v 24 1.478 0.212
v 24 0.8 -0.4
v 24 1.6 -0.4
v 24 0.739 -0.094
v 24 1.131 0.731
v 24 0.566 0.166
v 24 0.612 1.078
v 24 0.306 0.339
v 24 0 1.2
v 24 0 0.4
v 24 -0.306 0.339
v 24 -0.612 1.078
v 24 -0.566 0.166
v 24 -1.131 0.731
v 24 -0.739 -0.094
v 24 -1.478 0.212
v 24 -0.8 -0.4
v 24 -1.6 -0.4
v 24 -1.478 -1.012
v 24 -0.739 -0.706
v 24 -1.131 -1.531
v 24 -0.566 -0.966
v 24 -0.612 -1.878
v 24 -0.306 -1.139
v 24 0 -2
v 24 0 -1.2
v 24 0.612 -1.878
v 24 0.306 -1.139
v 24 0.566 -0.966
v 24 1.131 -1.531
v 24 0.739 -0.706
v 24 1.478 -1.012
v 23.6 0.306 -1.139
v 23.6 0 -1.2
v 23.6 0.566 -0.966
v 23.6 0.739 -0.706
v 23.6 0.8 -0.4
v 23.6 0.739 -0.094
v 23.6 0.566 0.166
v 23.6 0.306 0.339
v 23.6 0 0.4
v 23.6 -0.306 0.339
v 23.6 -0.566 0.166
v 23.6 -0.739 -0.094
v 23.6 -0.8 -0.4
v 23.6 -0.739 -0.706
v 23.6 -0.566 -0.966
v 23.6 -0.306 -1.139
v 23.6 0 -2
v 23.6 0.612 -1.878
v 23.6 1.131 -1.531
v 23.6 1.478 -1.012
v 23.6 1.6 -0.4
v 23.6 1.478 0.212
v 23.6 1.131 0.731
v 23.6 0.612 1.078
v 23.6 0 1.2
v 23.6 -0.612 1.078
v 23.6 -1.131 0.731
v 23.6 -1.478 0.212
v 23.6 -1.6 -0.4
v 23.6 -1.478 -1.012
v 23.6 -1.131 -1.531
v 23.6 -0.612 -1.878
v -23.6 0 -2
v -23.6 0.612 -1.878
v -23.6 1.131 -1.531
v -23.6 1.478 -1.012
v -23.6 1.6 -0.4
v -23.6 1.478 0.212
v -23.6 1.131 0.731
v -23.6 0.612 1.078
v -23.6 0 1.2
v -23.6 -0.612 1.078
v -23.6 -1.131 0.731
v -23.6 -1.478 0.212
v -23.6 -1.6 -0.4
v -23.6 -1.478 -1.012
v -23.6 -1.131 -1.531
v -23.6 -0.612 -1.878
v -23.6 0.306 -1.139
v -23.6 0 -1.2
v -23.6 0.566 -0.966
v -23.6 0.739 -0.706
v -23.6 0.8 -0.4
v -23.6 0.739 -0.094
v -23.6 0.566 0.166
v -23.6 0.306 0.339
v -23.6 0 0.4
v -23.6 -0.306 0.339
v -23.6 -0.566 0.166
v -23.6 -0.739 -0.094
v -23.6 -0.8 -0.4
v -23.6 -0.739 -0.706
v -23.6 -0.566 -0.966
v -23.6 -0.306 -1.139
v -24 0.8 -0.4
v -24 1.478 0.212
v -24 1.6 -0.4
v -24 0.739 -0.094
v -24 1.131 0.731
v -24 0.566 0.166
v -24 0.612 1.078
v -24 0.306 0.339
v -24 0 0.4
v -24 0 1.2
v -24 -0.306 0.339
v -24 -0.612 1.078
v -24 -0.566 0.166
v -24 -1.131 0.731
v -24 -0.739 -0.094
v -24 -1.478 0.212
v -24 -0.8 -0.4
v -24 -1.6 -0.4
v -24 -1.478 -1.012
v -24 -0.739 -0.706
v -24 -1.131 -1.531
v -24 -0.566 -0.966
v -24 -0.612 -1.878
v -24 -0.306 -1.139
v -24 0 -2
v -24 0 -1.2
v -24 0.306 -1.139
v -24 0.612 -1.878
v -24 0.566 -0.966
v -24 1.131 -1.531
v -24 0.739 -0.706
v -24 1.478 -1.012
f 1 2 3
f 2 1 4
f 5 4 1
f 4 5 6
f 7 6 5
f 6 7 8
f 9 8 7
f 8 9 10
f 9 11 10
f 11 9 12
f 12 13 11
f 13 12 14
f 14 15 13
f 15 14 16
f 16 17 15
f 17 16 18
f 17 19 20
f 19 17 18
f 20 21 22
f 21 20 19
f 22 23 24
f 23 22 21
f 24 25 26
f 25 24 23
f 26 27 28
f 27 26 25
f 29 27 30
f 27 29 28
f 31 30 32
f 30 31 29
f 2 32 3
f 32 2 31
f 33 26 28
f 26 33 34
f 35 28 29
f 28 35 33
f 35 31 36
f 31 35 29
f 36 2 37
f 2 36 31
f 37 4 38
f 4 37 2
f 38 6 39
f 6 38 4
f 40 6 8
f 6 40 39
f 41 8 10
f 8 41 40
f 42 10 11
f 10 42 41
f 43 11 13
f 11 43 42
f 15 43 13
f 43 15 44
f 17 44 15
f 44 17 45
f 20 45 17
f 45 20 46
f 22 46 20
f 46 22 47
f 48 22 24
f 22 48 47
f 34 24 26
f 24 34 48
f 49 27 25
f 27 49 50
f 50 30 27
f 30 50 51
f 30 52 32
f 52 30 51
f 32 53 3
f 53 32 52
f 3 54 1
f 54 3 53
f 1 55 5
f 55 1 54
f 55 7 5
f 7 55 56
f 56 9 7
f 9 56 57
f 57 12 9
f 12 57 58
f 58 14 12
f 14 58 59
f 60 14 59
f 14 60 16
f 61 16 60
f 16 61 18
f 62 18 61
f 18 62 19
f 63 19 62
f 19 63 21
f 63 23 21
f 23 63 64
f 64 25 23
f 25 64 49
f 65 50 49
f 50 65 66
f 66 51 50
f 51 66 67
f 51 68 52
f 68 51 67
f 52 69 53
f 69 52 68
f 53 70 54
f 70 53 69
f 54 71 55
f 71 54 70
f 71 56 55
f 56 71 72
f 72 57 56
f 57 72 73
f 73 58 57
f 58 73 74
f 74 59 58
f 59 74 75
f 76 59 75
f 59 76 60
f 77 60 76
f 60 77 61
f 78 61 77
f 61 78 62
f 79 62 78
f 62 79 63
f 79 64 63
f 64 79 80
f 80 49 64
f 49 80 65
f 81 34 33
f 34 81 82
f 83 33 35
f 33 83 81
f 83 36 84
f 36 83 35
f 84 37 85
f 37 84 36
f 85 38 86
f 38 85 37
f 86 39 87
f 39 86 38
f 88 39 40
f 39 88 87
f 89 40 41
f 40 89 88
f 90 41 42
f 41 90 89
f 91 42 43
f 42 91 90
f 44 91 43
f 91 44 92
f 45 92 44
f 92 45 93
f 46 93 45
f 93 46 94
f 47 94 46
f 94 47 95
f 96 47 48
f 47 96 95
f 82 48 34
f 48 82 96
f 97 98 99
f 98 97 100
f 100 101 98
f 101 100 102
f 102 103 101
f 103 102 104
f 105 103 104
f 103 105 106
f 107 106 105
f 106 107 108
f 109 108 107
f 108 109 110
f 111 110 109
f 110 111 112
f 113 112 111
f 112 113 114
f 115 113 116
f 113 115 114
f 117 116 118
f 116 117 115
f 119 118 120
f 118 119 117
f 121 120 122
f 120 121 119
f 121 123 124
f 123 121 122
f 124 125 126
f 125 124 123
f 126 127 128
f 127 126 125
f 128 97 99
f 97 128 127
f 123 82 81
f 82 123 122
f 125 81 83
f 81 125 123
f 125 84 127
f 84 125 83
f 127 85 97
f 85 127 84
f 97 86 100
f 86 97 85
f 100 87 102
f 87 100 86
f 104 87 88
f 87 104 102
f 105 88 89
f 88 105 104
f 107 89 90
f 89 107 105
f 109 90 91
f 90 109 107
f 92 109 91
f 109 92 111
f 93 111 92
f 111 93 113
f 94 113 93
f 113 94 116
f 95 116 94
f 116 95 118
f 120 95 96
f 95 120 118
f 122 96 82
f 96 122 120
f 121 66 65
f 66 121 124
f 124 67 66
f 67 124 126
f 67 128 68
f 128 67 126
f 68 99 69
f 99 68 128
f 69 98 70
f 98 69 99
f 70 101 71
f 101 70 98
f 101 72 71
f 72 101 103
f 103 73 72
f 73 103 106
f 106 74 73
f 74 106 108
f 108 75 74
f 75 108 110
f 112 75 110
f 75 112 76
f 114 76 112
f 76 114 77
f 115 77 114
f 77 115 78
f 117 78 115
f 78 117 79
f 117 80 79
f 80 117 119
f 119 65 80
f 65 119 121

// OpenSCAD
// file: ../p/4-4disc.scad
use <../lib.scad>
$fa=1; $fs=0.2;
function ldraw_lib__4_4disc(realsolid=false) = [
// 0 Disc 1.0
// 0 Name: 4-4disc.dat
// 0 Author: James Jessiman
// 0 !LDRAW_ORG Primitive UPDATE 2002-02
// 0 !LICENSE Licensed under CC BY 2.0 and CC BY 4.0 : see CAreadme.txt
// 
// 0 BFC CERTIFY CCW
  [0,"BFC","CERTIFY"],
  [0,"BFC","CCW"],
// 
// 0 !HISTORY 1998-12-15 [PTadmin] Official Update 1998-10
// 0 !HISTORY 2002-03-23 [sbliss] Added BFC statement
// 0 !HISTORY 2002-04-25 [PTadmin] Official Update 2002-02
// 0 !HISTORY 2007-06-24 [PTadmin] Header formatted for Contributor Agreement
// 0 !HISTORY 2008-07-01 [PTadmin] Official Update 2008-01
// 
// 
// 3 16 0 0 0 1 0 0 0.9239 0 0.3827
  [3,16,0,0,0,1,0,0,0.9239,0,0.3827],
// 3 16 0 0 0 0.9239 0 0.3827 0.7071 0 0.7071
  [3,16,0,0,0,0.9239,0,0.3827,0.7071,0,0.7071],
// 3 16 0 0 0 0.7071 0 0.7071 0.3827 0 0.9239
  [3,16,0,0,0,0.7071,0,0.7071,0.3827,0,0.9239],
// 3 16 0 0 0 0.3827 0 0.9239 0 0 1
  [3,16,0,0,0,0.3827,0,0.9239,0,0,1],
// 3 16 0 0 0 0 0 1 -0.3827 0 0.9239
  [3,16,0,0,0,0,0,1,-0.3827,0,0.9239],
// 3 16 0 0 0 -0.3827 0 0.9239 -0.7071 0 0.7071
  [3,16,0,0,0,-0.3827,0,0.9239,-0.7071,0,0.7071],
// 3 16 0 0 0 -0.7071 0 0.7071 -0.9239 0 0.3827
  [3,16,0,0,0,-0.7071,0,0.7071,-0.9239,0,0.3827],
// 3 16 0 0 0 -0.9239 0 0.3827 -1 0 -0
  [3,16,0,0,0,-0.9239,0,0.3827,-1,0,-0],
// 3 16 0 0 0 -1 0 -0 -0.9239 0 -0.3827
  [3,16,0,0,0,-1,0,-0,-0.9239,0,-0.3827],
// 3 16 0 0 0 -0.9239 0 -0.3827 -0.7071 0 -0.7071
  [3,16,0,0,0,-0.9239,0,-0.3827,-0.7071,0,-0.7071],
// 3 16 0 0 0 -0.7071 0 -0.7071 -0.3827 0 -0.9239
  [3,16,0,0,0,-0.7071,0,-0.7071,-0.3827,0,-0.9239],
// 3 16 0 0 0 -0.3827 0 -0.9239 0 0 -1
  [3,16,0,0,0,-0.3827,0,-0.9239,0,0,-1],
// 3 16 0 0 0 0 0 -1 0.3827 0 -0.9239
  [3,16,0,0,0,0,0,-1,0.3827,0,-0.9239],
// 3 16 0 0 0 0.3827 0 -0.9239 0.7071 0 -0.7071
  [3,16,0,0,0,0.3827,0,-0.9239,0.7071,0,-0.7071],
// 3 16 0 0 0 0.7071 0 -0.7071 0.9239 0 -0.3827
  [3,16,0,0,0,0.7071,0,-0.7071,0.9239,0,-0.3827],
// 3 16 0 0 0 0.9239 0 -0.3827 1 0 0
  [3,16,0,0,0,0.9239,0,-0.3827,1,0,0],
// 0
];
module ldraw_lib__4_4disc(step=0, col=false, unit=2/5, alt=false, line=0.2, solid=!$preview)
    makepoly(ldraw_lib__4_4disc(solid), step=step, col=col, unit=unit, alt=alt, line=line, solid=solid);
ldraw_lib__4_4disc(line=0.2);
// file: ../p/stud3.scad
use <../lib.scad>
use <4-4cyli.scad>
use <4-4disc.scad>
use <4-4edge.scad>
$fa=1; $fs=0.2;
function ldraw_lib__stud3(realsolid=false) = realsolid ? 
    [openscad(translate([0,0,-eps()], o=cylinder(4+eps(), r=4)),2)] : [
// 0 Stud Tube Solid
// 0 Name: stud3.dat
// 0 Author: James Jessiman
// 0 !LDRAW_ORG Primitive UPDATE 2012-01
// 0 !LICENSE Licensed under CC BY 2.0 and CC BY 4.0 : see CAreadme.txt
// 
// 0 BFC CERTIFY CCW
  [0,"BFC","CERTIFY"],
  [0,"BFC","CCW"],
// 
// 0 !HISTORY 2002-04-04 [sbliss] Modified for BFC compliance
// 0 !HISTORY 2002-04-25 [PTadmin] Official Update 2002-02
// 0 !HISTORY 2007-06-24 [PTadmin] Header formatted for Contributor Agreement
// 0 !HISTORY 2008-07-01 [PTadmin] Official Update 2008-01
// 0 !HISTORY 2012-02-16 [Philo] Changed to CCW
// 0 !HISTORY 2012-03-30 [PTadmin] Official Update 2012-01
// 
// 
// 1 16 0 -4 0 4 0 0 0 1 0 0 0 4 4-4edge.dat
  [1,16,0,-4,0,4,0,0,0,1,0,0,0,4, ldraw_lib__4_4edge(realsolid)],
// 1 16 0 0 0 4 0 0 0 1 0 0 0 4 4-4edge.dat
  [1,16,0,0,0,4,0,0,0,1,0,0,0,4, ldraw_lib__4_4edge(realsolid)],
// 1 16 0 -4 0 4 0 0 0 1 0 0 0 4 4-4disc.dat
  [1,16,0,-4,0,4,0,0,0,1,0,0,0,4, ldraw_lib__4_4disc(realsolid)],
// 1 16 0 -4 0 4 0 0 0 4 0 0 0 4 4-4cyli.dat
  [1,16,0,-4,0,4,0,0,0,4,0,0,0,4, ldraw_lib__4_4cyli(realsolid)],
];
module ldraw_lib__stud3(step=0, col=false, unit=2/5, alt=false, line=0.2, solid=!$preview)
    makepoly(ldraw_lib__stud3(solid), step=step, col=col, unit=unit, alt=alt, line=line, solid=solid);
ldraw_lib__stud3(line=0.2);
// file: ../p/stud.scad
use <../lib.scad>
use <4-4cyli.scad>
use <4-4disc.scad>
use <4-4edge.scad>
$fa=1; $fs=0.2;
function ldraw_lib__stud(realsolid=false) = realsolid ? 
    [openscad(translate([0,0,-eps()], o=cylinder(4+eps(), r=6)),2)] : [
// 0 Stud
// 0 Name: stud.dat
// 0 Author: James Jessiman
// 0 !LDRAW_ORG Primitive UPDATE 2012-01
// 0 !LICENSE Licensed under CC BY 2.0 and CC BY 4.0 : see CAreadme.txt
// 
// 0 BFC CERTIFY CCW
  [0,"BFC","CERTIFY"],
  [0,"BFC","CCW"],
// 
// 0 !HISTORY 2002-04-04 [sbliss] Modified for BFC compliance
// 0 !HISTORY 2002-04-25 [PTadmin] Official Update 2002-02
// 0 !HISTORY 2007-06-24 [PTadmin] Header formatted for Contributor Agreement
// 0 !HISTORY 2008-07-01 [PTadmin] Official Update 2008-01
// 0 !HISTORY 2012-02-16 [Philo] Changed to CCW
// 0 !HISTORY 2012-03-30 [PTadmin] Official Update 2012-01
// 
// 
// 1 16 0 0 0 6 0 0 0 1 0 0 0 6 4-4edge.dat
  [1,16,0,0,0,6,0,0,0,1,0,0,0,6, ldraw_lib__4_4edge(realsolid)],
// 1 16 0 -4 0 6 0 0 0 1 0 0 0 6 4-4edge.dat
  [1,16,0,-4,0,6,0,0,0,1,0,0,0,6, ldraw_lib__4_4edge(realsolid)],
// 1 16 0 0 0 6 0 0 0 -4 0 0 0 6 4-4cyli.dat
  [1,16,0,0,0,6,0,0,0,-4,0,0,0,6, ldraw_lib__4_4cyli(realsolid)],
// 1 16 0 -4 0 6 0 0 0 1 0 0 0 6 4-4disc.dat
  [1,16,0,-4,0,6,0,0,0,1,0,0,0,6, ldraw_lib__4_4disc(realsolid)],
];
module ldraw_lib__stud(step=0, col=false, unit=2/5, alt=false, line=0.2, solid=!$preview)
    makepoly(ldraw_lib__stud(solid), step=step, col=col, unit=unit, alt=alt, line=line, solid=solid);
ldraw_lib__stud(line=0.2);
// file: ../p/box5.scad
use <../lib.scad>
$fa=1; $fs=0.2;
function ldraw_lib__box5(realsolid=false) = [
// 0 Box with 5 Faces and All Edges
// 0 Name: box5.dat
// 0 Author: James Jessiman
// 0 !LDRAW_ORG Primitive UPDATE 2012-01
// 0 !LICENSE Licensed under CC BY 2.0 and CC BY 4.0 : see CAreadme.txt
// 
// 0 BFC CERTIFY CCW
  [0,"BFC","CERTIFY"],
  [0,"BFC","CCW"],
// 
// 0 !HISTORY 2002-04-03 [sbliss] Modified for BFC compliance
// 0 !HISTORY 2002-04-25 [PTadmin] Official Update 2002-02
// 0 !HISTORY 2007-06-24 [PTadmin] Header formatted for Contributor Agreement
// 0 !HISTORY 2008-07-01 [PTadmin] Official Update 2008-01
// 0 !HISTORY 2012-02-16 [Philo] Changed to CCW
// 0 !HISTORY 2012-03-30 [PTadmin] Official Update 2012-01
// 
// 
// 2 24 1 1 1 -1 1 1
  [2,24,1,1,1,-1,1,1],
// 2 24 -1 1 1 -1 1 -1
  [2,24,-1,1,1,-1,1,-1],
// 2 24 -1 1 -1 1 1 -1
  [2,24,-1,1,-1,1,1,-1],
// 2 24 1 1 -1 1 1 1
  [2,24,1,1,-1,1,1,1],
// 2 24 1 0 1 -1 0 1
  [2,24,1,0,1,-1,0,1],
// 2 24 -1 0 1 -1 0 -1
  [2,24,-1,0,1,-1,0,-1],
// 2 24 -1 0 -1 1 0 -1
  [2,24,-1,0,-1,1,0,-1],
// 2 24 1 0 -1 1 0 1
  [2,24,1,0,-1,1,0,1],
// 2 24 1 0 1 1 1 1
  [2,24,1,0,1,1,1,1],
// 2 24 -1 0 1 -1 1 1
  [2,24,-1,0,1,-1,1,1],
// 2 24 1 0 -1 1 1 -1
  [2,24,1,0,-1,1,1,-1],
// 2 24 -1 0 -1 -1 1 -1
  [2,24,-1,0,-1,-1,1,-1],
// 4 16 -1 1 1 1 1 1 1 1 -1 -1 1 -1
  [4,16,-1,1,1,1,1,1,1,1,-1,-1,1,-1],
// 4 16 -1 1 1 -1 0 1 1 0 1 1 1 1
  [4,16,-1,1,1,-1,0,1,1,0,1,1,1,1],
// 4 16 -1 1 -1 -1 0 -1 -1 0 1 -1 1 1
  [4,16,-1,1,-1,-1,0,-1,-1,0,1,-1,1,1],
// 4 16 1 1 -1 1 0 -1 -1 0 -1 -1 1 -1
  [4,16,1,1,-1,1,0,-1,-1,0,-1,-1,1,-1],
// 4 16 1 1 1 1 0 1 1 0 -1 1 1 -1
  [4,16,1,1,1,1,0,1,1,0,-1,1,1,-1],
];
module ldraw_lib__box5(step=0, col=false, unit=2/5, alt=false, line=0.2, solid=!$preview)
    makepoly(ldraw_lib__box5(solid), step=step, col=col, unit=unit, alt=alt, line=line, solid=solid);
ldraw_lib__box5(line=0.2);
// file: ../p/box4t.scad
use <../lib.scad>
$fa=1; $fs=0.2;
function ldraw_lib__box4t(realsolid=false) = [
// 0 Box with 4 Adjacent Faces and All Edges
// 0 Name: box4t.dat
// 0 Author: Tore Eriksson [Tore_Eriksson]
// 0 !LDRAW_ORG Primitive UPDATE 2003-02
// 0 !LICENSE Licensed under CC BY 2.0 and CC BY 4.0 : see CAreadme.txt
// 
// 0 BFC CERTIFY CCW
  [0,"BFC","CERTIFY"],
  [0,"BFC","CCW"],
// 
// 0 !HISTORY 1997-09-29 [PTadmin] Official Update 1997-15
// 0 !HISTORY 2002-08-31 [izanette] Modified with WINDZ for BFC compliance
// 0 !HISTORY 2003-08-01 [PTadmin] Official Update 2003-02
// 0 !HISTORY 2007-06-24 [PTadmin] Header formatted for Contributor Agreement
// 0 !HISTORY 2008-07-01 [PTadmin] Official Update 2008-01
// 
// 
// 2 24 1 1 1 -1 1 1
  [2,24,1,1,1,-1,1,1],
// 2 24 -1 1 1 -1 1 -1
  [2,24,-1,1,1,-1,1,-1],
// 2 24 -1 1 -1 1 1 -1
  [2,24,-1,1,-1,1,1,-1],
// 2 24 1 1 -1 1 1 1
  [2,24,1,1,-1,1,1,1],
// 2 24 1 0 1 -1 0 1
  [2,24,1,0,1,-1,0,1],
// 2 24 -1 0 1 -1 0 -1
  [2,24,-1,0,1,-1,0,-1],
// 2 24 -1 0 -1 1 0 -1
  [2,24,-1,0,-1,1,0,-1],
// 2 24 1 0 -1 1 0 1
  [2,24,1,0,-1,1,0,1],
// 2 24 1 0 1 1 1 1
  [2,24,1,0,1,1,1,1],
// 2 24 -1 0 1 -1 1 1
  [2,24,-1,0,1,-1,1,1],
// 2 24 1 0 -1 1 1 -1
  [2,24,1,0,-1,1,1,-1],
// 2 24 -1 0 -1 -1 1 -1
  [2,24,-1,0,-1,-1,1,-1],
// 4 16 1 1 1 1 1 -1 -1 1 -1 -1 1 1
  [4,16,1,1,1,1,1,-1,-1,1,-1,-1,1,1],
// 4 16 1 1 1 -1 1 1 -1 0 1 1 0 1
  [4,16,1,1,1,-1,1,1,-1,0,1,1,0,1],
// 4 16 -1 1 1 -1 1 -1 -1 0 -1 -1 0 1
  [4,16,-1,1,1,-1,1,-1,-1,0,-1,-1,0,1],
// 0 4 16 -1 1 -1 -1 0 -1 1 0 -1 1 1 -1
// 4 16 1 1 -1 1 1 1 1 0 1 1 0 -1
  [4,16,1,1,-1,1,1,1,1,0,1,1,0,-1],
// 0
];
module ldraw_lib__box4t(step=0, col=false, unit=2/5, alt=false, line=0.2, solid=!$preview)
    makepoly(ldraw_lib__box4t(solid), step=step, col=col, unit=unit, alt=alt, line=line, solid=solid);
ldraw_lib__box4t(line=0.2);
// file: ../p/4-4ring1.scad
use <../lib.scad>
$fa=1; $fs=0.2;
function ldraw_lib__4_4ring1(realsolid=false) = [
// 0 Ring  1 x 1.0
// 0 Name: 4-4ring1.dat
// 0 Author: James Jessiman
// 0 !LDRAW_ORG Primitive UPDATE 2009-01
// 0 !LICENSE Licensed under CC BY 2.0 and CC BY 4.0 : see CAreadme.txt
// 
// 0 BFC CERTIFY CCW
  [0,"BFC","CERTIFY"],
  [0,"BFC","CCW"],
// 
// 0 !HISTORY 1998-12-15 [PTadmin] Official Update 1998-10
// 0 !HISTORY 2002-04-08 [BrickCaster] Modified for BFC compliance
// 0 !HISTORY 2002-04-25 [PTadmin] Official Update 2002-02
// 0 !HISTORY 2007-06-24 [PTadmin] Header formatted for Contributor Agreement
// 0 !HISTORY 2008-07-01 [PTadmin] Official Update 2008-01
// 0 !HISTORY 2008-08-26 [cwdee] Switch polygon winding and rename
// 0 !HISTORY 2009-05-02 [PTadmin] Official Update 2009-01
// 
// 
// 4 16 -0.7654 0 1.8478 -0.3827 0 0.9239 0 0 1 0 0 2
  [4,16,-0.7654,0,1.8478,-0.3827,0,0.9239,0,0,1,0,0,2],
// 4 16 -1.4142 0 1.4142 -0.7071 0 0.7071 -0.3827 0 0.9239 -0.7654 0 1.8478
  [4,16,-1.4142,0,1.4142,-0.7071,0,0.7071,-0.3827,0,0.9239,-0.7654,0,1.8478],
// 4 16 -1.8478 0 0.7654 -0.9239 0 0.3827 -0.7071 0 0.7071 -1.4142 0 1.41420
  [4,16,-1.8478,0,0.7654,-0.9239,0,0.3827,-0.7071,0,0.7071,-1.4142,0,1.41420],
// 4 16 -2 0 0 -1 0 0 -0.9239 0 0.3827 -1.8478 0 0.7654
  [4,16,-2,0,0,-1,0,0,-0.9239,0,0.3827,-1.8478,0,0.7654],
// 4 16 -1.8478 0 -0.7654 -0.9239 0 -0.3827 -1 0 0 -2 0 0
  [4,16,-1.8478,0,-0.7654,-0.9239,0,-0.3827,-1,0,0,-2,0,0],
// 4 16 -1.4142 0 -1.4142 -0.7071 0 -0.7071 -0.9239 0 -0.3827 -1.8478 0 -0.7654
  [4,16,-1.4142,0,-1.4142,-0.7071,0,-0.7071,-0.9239,0,-0.3827,-1.8478,0,-0.7654],
// 4 16 -0.7654 0 -1.8478 -0.3827 0 -0.9239 -0.7071 0 -0.7071 -1.4142 0 -1.4142
  [4,16,-0.7654,0,-1.8478,-0.3827,0,-0.9239,-0.7071,0,-0.7071,-1.4142,0,-1.4142],
// 4 16 0 0 -2 0 0 -1 -0.3827 0 -0.9239 -0.7654 0 -1.8478
  [4,16,0,0,-2,0,0,-1,-0.3827,0,-0.9239,-0.7654,0,-1.8478],
// 4 16 0.7654 0 -1.8478 0.3827 0 -0.9239 0 0 -1 0 0 -2
  [4,16,0.7654,0,-1.8478,0.3827,0,-0.9239,0,0,-1,0,0,-2],
// 4 16 1.4142 0 -1.4142 0.7071 0 -0.7071 0.3827 0 -0.9239 0.7654 0 -1.8478
  [4,16,1.4142,0,-1.4142,0.7071,0,-0.7071,0.3827,0,-0.9239,0.7654,0,-1.8478],
// 4 16 1.8478 0 -0.7654 0.9239 0 -0.3827 0.7071 0 -0.7071 1.4142 0 -1.4142
  [4,16,1.8478,0,-0.7654,0.9239,0,-0.3827,0.7071,0,-0.7071,1.4142,0,-1.4142],
// 4 16 2 0 0 1 0 0 0.9239 0 -0.3827 1.8478 0 -0.7654
  [4,16,2,0,0,1,0,0,0.9239,0,-0.3827,1.8478,0,-0.7654],
// 4 16 1.8478 0 0.7654 0.9239 0 0.3827 1 0 0 2 0 0
  [4,16,1.8478,0,0.7654,0.9239,0,0.3827,1,0,0,2,0,0],
// 4 16 1.4142 0 1.4142 0.7071 0 0.7071 0.9239 0 0.3827 1.8478 0 0.7654
  [4,16,1.4142,0,1.4142,0.7071,0,0.7071,0.9239,0,0.3827,1.8478,0,0.7654],
// 4 16 0.7654 0 1.8478 0.3827 0 0.9239 0.7071 0 0.7071 1.4142 0 1.4142
  [4,16,0.7654,0,1.8478,0.3827,0,0.9239,0.7071,0,0.7071,1.4142,0,1.4142],
// 4 16 0 0 2 0 0 1 0.3827 0 0.9239 0.7654 0 1.8478
  [4,16,0,0,2,0,0,1,0.3827,0,0.9239,0.7654,0,1.8478],
// 0
];
module ldraw_lib__4_4ring1(step=0, col=false, unit=2/5, alt=false, line=0.2, solid=!$preview)
    makepoly(ldraw_lib__4_4ring1(solid), step=step, col=col, unit=unit, alt=alt, line=line, solid=solid);
ldraw_lib__4_4ring1(line=0.2);
// file: ../p/4-4edge.scad
use <../lib.scad>
$fa=1; $fs=0.2;
function ldraw_lib__4_4edge(realsolid=false) = [
// 0 Circle 1.0
// 0 Name: 4-4edge.dat
// 0 Author: James Jessiman
// 0 !LDRAW_ORG Primitive UPDATE 2017-01
// 0 !LICENSE Licensed under CC BY 2.0 and CC BY 4.0 : see CAreadme.txt
// 
// 0 BFC CERTIFY CCW
  [0,"BFC","CERTIFY"],
  [0,"BFC","CCW"],
// 
// 0 !HISTORY 1998-12-15 [PTadmin] Official Update 1998-10
// 0 !HISTORY 2005-12-28 [PTadmin] Official Update 2005-01
// 0 !HISTORY 2007-06-24 [PTadmin] Header formatted for Contributor Agreement
// 0 !HISTORY 2008-07-01 [PTadmin] Official Update 2008-01
// 0 !HISTORY 2017-01-15 [Steffen] BFCed
// 0 !HISTORY 2017-12-30 [PTadmin] Official Update 2017-01
// 
// 
// 2 24 1 0 0 0.9239 0 0.3827
  [2,24,1,0,0,0.9239,0,0.3827],
// 2 24 0.9239 0 0.3827 0.7071 0 0.7071
  [2,24,0.9239,0,0.3827,0.7071,0,0.7071],
// 2 24 0.7071 0 0.7071 0.3827 0 0.9239
  [2,24,0.7071,0,0.7071,0.3827,0,0.9239],
// 2 24 0.3827 0 0.9239 0 0 1
  [2,24,0.3827,0,0.9239,0,0,1],
// 2 24 0 0 1 -0.3827 0 0.9239
  [2,24,0,0,1,-0.3827,0,0.9239],
// 2 24 -0.3827 0 0.9239 -0.7071 0 0.7071
  [2,24,-0.3827,0,0.9239,-0.7071,0,0.7071],
// 2 24 -0.7071 0 0.7071 -0.9239 0 0.3827
  [2,24,-0.7071,0,0.7071,-0.9239,0,0.3827],
// 2 24 -0.9239 0 0.3827 -1 0 -0
  [2,24,-0.9239,0,0.3827,-1,0,-0],
// 2 24 -1 0 -0 -0.9239 0 -0.3827
  [2,24,-1,0,-0,-0.9239,0,-0.3827],
// 2 24 -0.9239 0 -0.3827 -0.7071 0 -0.7071
  [2,24,-0.9239,0,-0.3827,-0.7071,0,-0.7071],
// 2 24 -0.7071 0 -0.7071 -0.3827 0 -0.9239
  [2,24,-0.7071,0,-0.7071,-0.3827,0,-0.9239],
// 2 24 -0.3827 0 -0.9239 0 0 -1
  [2,24,-0.3827,0,-0.9239,0,0,-1],
// 2 24 0 0 -1 0.3827 0 -0.9239
  [2,24,0,0,-1,0.3827,0,-0.9239],
// 2 24 0.3827 0 -0.9239 0.7071 0 -0.7071
  [2,24,0.3827,0,-0.9239,0.7071,0,-0.7071],
// 2 24 0.7071 0 -0.7071 0.9239 0 -0.3827
  [2,24,0.7071,0,-0.7071,0.9239,0,-0.3827],
// 2 24 0.9239 0 -0.3827 1 0 0
  [2,24,0.9239,0,-0.3827,1,0,0],
];
module ldraw_lib__4_4edge(step=0, col=false, unit=2/5, alt=false, line=0.2, solid=!$preview)
    makepoly(ldraw_lib__4_4edge(solid), step=step, col=col, unit=unit, alt=alt, line=line, solid=solid);
ldraw_lib__4_4edge(line=0.2);
// file: ../p/4-4cyli.scad
use <../lib.scad>
$fa=1; $fs=0.2;
function ldraw_lib__4_4cyli(realsolid=false) = [
// 0 Cylinder 1.0
// 0 Name: 4-4cyli.dat
// 0 Author: James Jessiman
// 0 !LDRAW_ORG Primitive UPDATE 2005-01
// 0 !LICENSE Licensed under CC BY 2.0 and CC BY 4.0 : see CAreadme.txt
// 
// 0 BFC CERTIFY CCW
  [0,"BFC","CERTIFY"],
  [0,"BFC","CCW"],
// 
// 0 !HISTORY 1998-12-15 [PTadmin] Official Update 1998-10
// 0 !HISTORY 2002-03-23 [sbliss] Added BFC statement; merged headers from files in distributions LDraw 0.27 and Complete.
// 0 !HISTORY 2002-04-25 [PTadmin] Official Update 2002-02
// 0 !HISTORY 2004-12-14 [guyvivan] BFC CCW
// 0 !HISTORY 2005-12-28 [PTadmin] Official Update 2005-01
// 0 !HISTORY 2007-06-24 [PTadmin] Header formatted for Contributor Agreement
// 0 !HISTORY 2008-07-01 [PTadmin] Official Update 2008-01
// 
// 
// 4 16 1 1 0 0.9239 1 0.3827 0.9239 0 0.3827 1 0 0
  [4,16,1,1,0,0.9239,1,0.3827,0.9239,0,0.3827,1,0,0],
// 5 24 1 0 0 1 1 0 0.9239 0 0.3827 0.9239 0 -0.3827
  [5,24,1,0,0,1,1,0,0.9239,0,0.3827,0.9239,0,-0.3827],
// 4 16 0.9239 1 0.3827 0.7071 1 0.7071 0.7071 0 0.7071 0.9239 0 0.3827
  [4,16,0.9239,1,0.3827,0.7071,1,0.7071,0.7071,0,0.7071,0.9239,0,0.3827],
// 5 24 0.9239 0 0.3827 0.9239 1 0.3827 0.7071 0 0.7071 1 0 0
  [5,24,0.9239,0,0.3827,0.9239,1,0.3827,0.7071,0,0.7071,1,0,0],
// 4 16 0.7071 1 0.7071 0.3827 1 0.9239 0.3827 0 0.9239 0.7071 0 0.7071
  [4,16,0.7071,1,0.7071,0.3827,1,0.9239,0.3827,0,0.9239,0.7071,0,0.7071],
// 5 24 0.7071 0 0.7071 0.7071 1 0.7071 0.3827 0 0.9239 0.9239 0 0.3827
  [5,24,0.7071,0,0.7071,0.7071,1,0.7071,0.3827,0,0.9239,0.9239,0,0.3827],
// 4 16 0.3827 1 0.9239 0 1 1 0 0 1 0.3827 0 0.9239
  [4,16,0.3827,1,0.9239,0,1,1,0,0,1,0.3827,0,0.9239],
// 5 24 0.3827 0 0.9239 0.3827 1 0.9239 0 0 1 0.7071 0 0.7071
  [5,24,0.3827,0,0.9239,0.3827,1,0.9239,0,0,1,0.7071,0,0.7071],
// 4 16 0 1 1 -0.3827 1 0.9239 -0.3827 0 0.9239 0 0 1
  [4,16,0,1,1,-0.3827,1,0.9239,-0.3827,0,0.9239,0,0,1],
// 5 24 0 0 1 0 1 1 -0.3827 0 0.9239 0.3827 0 0.9239
  [5,24,0,0,1,0,1,1,-0.3827,0,0.9239,0.3827,0,0.9239],
// 4 16 -0.3827 1 0.9239 -0.7071 1 0.7071 -0.7071 0 0.7071 -0.3827 0 0.9239
  [4,16,-0.3827,1,0.9239,-0.7071,1,0.7071,-0.7071,0,0.7071,-0.3827,0,0.9239],
// 5 24 -0.3827 0 0.9239 -0.3827 1 0.9239 -0.7071 0 0.7071 0 0 1
  [5,24,-0.3827,0,0.9239,-0.3827,1,0.9239,-0.7071,0,0.7071,0,0,1],
// 4 16 -0.7071 1 0.7071 -0.9239 1 0.3827 -0.9239 0 0.3827 -0.7071 0 0.7071
  [4,16,-0.7071,1,0.7071,-0.9239,1,0.3827,-0.9239,0,0.3827,-0.7071,0,0.7071],
// 5 24 -0.7071 0 0.7071 -0.7071 1 0.7071 -0.9239 0 0.3827 -0.3827 0 0.9239
  [5,24,-0.7071,0,0.7071,-0.7071,1,0.7071,-0.9239,0,0.3827,-0.3827,0,0.9239],
// 4 16 -0.9239 1 0.3827 -1 1 0 -1 0 0 -0.9239 0 0.3827
  [4,16,-0.9239,1,0.3827,-1,1,0,-1,0,0,-0.9239,0,0.3827],
// 5 24 -0.9239 0 0.3827 -0.9239 1 0.3827 -1 0 0 -0.7071 0 0.7071
  [5,24,-0.9239,0,0.3827,-0.9239,1,0.3827,-1,0,0,-0.7071,0,0.7071],
// 4 16 -1 1 0 -0.9239 1 -0.3827 -0.9239 0 -0.3827 -1 0 0
  [4,16,-1,1,0,-0.9239,1,-0.3827,-0.9239,0,-0.3827,-1,0,0],
// 5 24 -1 0 0 -1 1 0 -0.9239 0 -0.3827 -0.9239 0 0.3827
  [5,24,-1,0,0,-1,1,0,-0.9239,0,-0.3827,-0.9239,0,0.3827],
// 4 16 -0.9239 1 -0.3827 -0.7071 1 -0.7071 -0.7071 0 -0.7071 -0.9239 0 -0.3827
  [4,16,-0.9239,1,-0.3827,-0.7071,1,-0.7071,-0.7071,0,-0.7071,-0.9239,0,-0.3827],
// 5 24 -0.9239 0 -0.3827 -0.9239 1 -0.3827 -0.7071 0 -0.7071 -1 0 0
  [5,24,-0.9239,0,-0.3827,-0.9239,1,-0.3827,-0.7071,0,-0.7071,-1,0,0],
// 4 16 -0.7071 1 -0.7071 -0.3827 1 -0.9239 -0.3827 0 -0.9239 -0.7071 0 -0.7071
  [4,16,-0.7071,1,-0.7071,-0.3827,1,-0.9239,-0.3827,0,-0.9239,-0.7071,0,-0.7071],
// 5 24 -0.7071 0 -0.7071 -0.7071 1 -0.7071 -0.3827 0 -0.9239 -0.9239 0 -0.3827
  [5,24,-0.7071,0,-0.7071,-0.7071,1,-0.7071,-0.3827,0,-0.9239,-0.9239,0,-0.3827],
// 4 16 -0.3827 1 -0.9239 0 1 -1 0 0 -1 -0.3827 0 -0.9239
  [4,16,-0.3827,1,-0.9239,0,1,-1,0,0,-1,-0.3827,0,-0.9239],
// 5 24 -0.3827 0 -0.9239 -0.3827 1 -0.9239 0 0 -1 -0.7071 0 -0.7071
  [5,24,-0.3827,0,-0.9239,-0.3827,1,-0.9239,0,0,-1,-0.7071,0,-0.7071],
// 4 16 0 1 -1 0.3827 1 -0.9239 0.3827 0 -0.9239 0 0 -1
  [4,16,0,1,-1,0.3827,1,-0.9239,0.3827,0,-0.9239,0,0,-1],
// 5 24 0 0 -1 0 1 -1 0.3827 0 -0.9239 -0.3827 0 -0.9239
  [5,24,0,0,-1,0,1,-1,0.3827,0,-0.9239,-0.3827,0,-0.9239],
// 4 16 0.3827 1 -0.9239 0.7071 1 -0.7071 0.7071 0 -0.7071 0.3827 0 -0.9239
  [4,16,0.3827,1,-0.9239,0.7071,1,-0.7071,0.7071,0,-0.7071,0.3827,0,-0.9239],
// 5 24 0.3827 0 -0.9239 0.3827 1 -0.9239 0.7071 0 -0.7071 0 0 -1
  [5,24,0.3827,0,-0.9239,0.3827,1,-0.9239,0.7071,0,-0.7071,0,0,-1],
// 4 16 0.7071 1 -0.7071 0.9239 1 -0.3827 0.9239 0 -0.3827 0.7071 0 -0.7071
  [4,16,0.7071,1,-0.7071,0.9239,1,-0.3827,0.9239,0,-0.3827,0.7071,0,-0.7071],
// 5 24 0.7071 0 -0.7071 0.7071 1 -0.7071 0.9239 0 -0.3827 0.3827 0 -0.9239
  [5,24,0.7071,0,-0.7071,0.7071,1,-0.7071,0.9239,0,-0.3827,0.3827,0,-0.9239],
// 4 16 0.9239 1 -0.3827 1 1 0 1 0 0 0.9239 0 -0.3827
  [4,16,0.9239,1,-0.3827,1,1,0,1,0,0,0.9239,0,-0.3827],
// 5 24 0.9239 0 -0.3827 0.9239 1 -0.3827 1 0 0 0.7071 0 -0.7071
  [5,24,0.9239,0,-0.3827,0.9239,1,-0.3827,1,0,0,0.7071,0,-0.7071],
// 0
];
module ldraw_lib__4_4cyli(step=0, col=false, unit=2/5, alt=false, line=0.2, solid=!$preview)
    makepoly(ldraw_lib__4_4cyli(solid), step=step, col=col, unit=unit, alt=alt, line=line, solid=solid);
ldraw_lib__4_4cyli(line=0.2);
// file: s/3004s01.scad
use <../../lib.scad>
use <../../p/box4t.scad>
use <../../p/box5.scad>
use <../../p/stud.scad>
use <../../p/stud3.scad>
$fa=1; $fs=0.2;
function ldraw_lib__s__3004s01(realsolid=false) = [
// 0 ~Brick  1 x  2 without Front Face
// 0 Name: s\3004s01.dat
// 0 Author: James Jessiman
// 0 !LDRAW_ORG Subpart UPDATE 2003-03
// 0 !LICENSE Licensed under CC BY 2.0 and CC BY 4.0 : see CAreadme.txt
// 
// 0 BFC CERTIFY CCW
  [0,"BFC","CERTIFY"],
  [0,"BFC","CCW"],
// 
// 0 !HISTORY 2003-09-07 [jriley] Subfiling, BFC
// 0 !HISTORY 2003-12-19 [PTadmin] Official Update 2003-03
// 0 !HISTORY 2007-08-29 [PTadmin] Header formatted for Contributor Agreement
// 0 !HISTORY 2008-07-01 [PTadmin] Official Update 2008-01
// 
// 
// 1 16 0 4 0 1 0 0 0 -5 0 0 0 1 stud3.dat
  [1,16,0,4,0,1,0,0,0,-5,0,0,0,1, ldraw_lib__stud3(realsolid)],
// 0 BFC INVERTNEXT
  [0,"BFC","INVERTNEXT"],
// 1 16 0 24 0 16 0 0 0 -20 0 0 0 6 box5.dat
  [1,16,0,24,0,16,0,0,0,-20,0,0,0,6, ldraw_lib__box5(realsolid)],
// 4 16 20 24 10 16 24 6 -16 24 6 -20 24 10
  [4,16,20,24,10,16,24,6,-16,24,6,-20,24,10],
// 4 16 -20 24 10 -16 24 6 -16 24 -6 -20 24 -10
  [4,16,-20,24,10,-16,24,6,-16,24,-6,-20,24,-10],
// 4 16 -20 24 -10 -16 24 -6 16 24 -6 20 24 -10
  [4,16,-20,24,-10,-16,24,-6,16,24,-6,20,24,-10],
// 4 16 20 24 -10 16 24 -6 16 24 6 20 24 10
  [4,16,20,24,-10,16,24,-6,16,24,6,20,24,10],
// 1 16 0 24 0 20 0 0 0 -24 0 0 0 10 box4t.dat
  [1,16,0,24,0,20,0,0,0,-24,0,0,0,10, ldraw_lib__box4t(realsolid)],
// 1 16 10 0 0 1 0 0 0 1 0 0 0 1 stud.dat
  [1,16,10,0,0,1,0,0,0,1,0,0,0,1, ldraw_lib__stud(realsolid)],
// 1 16 -10 0 0 1 0 0 0 1 0 0 0 1 stud.dat
  [1,16,-10,0,0,1,0,0,0,1,0,0,0,1, ldraw_lib__stud(realsolid)],
// 0
];
module ldraw_lib__s__3004s01(step=0, col=false, unit=2/5, alt=false, line=0.2, solid=!$preview)
    makepoly(ldraw_lib__s__3004s01(solid), step=step, col=col, unit=unit, alt=alt, line=line, solid=solid);
ldraw_lib__s__3004s01(line=0.2);
// file: u9053.scad
use <../lib.scad>
use <../p/4-4cyli.scad>
use <../p/4-4edge.scad>
use <../p/4-4ring1.scad>
$fa=1; $fs=0.2;
function ldraw_lib__u9053(realsolid=false) = [
// 0 ~Technic Flex-System Hose End
// 0 Name: u9053.dat
// 0 Author: William Howard [WilliamH]
// 0 !LDRAW_ORG Part UPDATE 2011-02
// 0 !LICENSE Licensed under CC BY 2.0 and CC BY 4.0 : see CAreadme.txt
// 
// 0 BFC CERTIFY CCW
  [0,"BFC","CERTIFY"],
  [0,"BFC","CCW"],
// 
// 0 !HISTORY 2011-12-21 [cwdee] Reworked subparting technique
// 0 !HISTORY 2011-12-23 [PTadmin] Renamed from 76
// 0 !HISTORY 2011-12-29 [PTadmin] Official Update 2011-02
// 
// 
// 1 16 0 0 0 2 0 0 0 1 0 0 0 2 4-4ring1.dat
  [1,16,0,0,0,2,0,0,0,1,0,0,0,2, ldraw_lib__4_4ring1(realsolid)],
// 1 16 0 0 0 2 0 0 0 1 0 0 0 2 4-4edge.dat
  [1,16,0,0,0,2,0,0,0,1,0,0,0,2, ldraw_lib__4_4edge(realsolid)],
// 0 BFC INVERTNEXT
  [0,"BFC","INVERTNEXT"],
// 1 16 0 0 0 2 0 0 0 1 0 0 0 2 4-4cyli.dat
  [1,16,0,0,0,2,0,0,0,1,0,0,0,2, ldraw_lib__4_4cyli(realsolid)],
// 1 16 0 0 0 4 0 0 0 1 0 0 0 4 4-4edge.dat
  [1,16,0,0,0,4,0,0,0,1,0,0,0,4, ldraw_lib__4_4edge(realsolid)],
// 1 16 0 0 0 4 0 0 0 1 0 0 0 4 4-4cyli.dat
  [1,16,0,0,0,4,0,0,0,1,0,0,0,4, ldraw_lib__4_4cyli(realsolid)],
// 0
];
module ldraw_lib__u9053(step=0, col=false, unit=2/5, alt=false, line=0.2, solid=!$preview)
    makepoly(ldraw_lib__u9053(solid), step=step, col=col, unit=unit, alt=alt, line=line, solid=solid);
ldraw_lib__u9053(line=0.2);
// file: 77.scad
use <../lib.scad>
use <../p/4-4cyli.scad>
$fa=1; $fs=0.2;
function ldraw_lib__77(realsolid=false) = [
// 0 ~Technic Flex-System Hose Segment
// 0 Name: 77.dat
// 0 Author: William Howard [WilliamH]
// 0 !LDRAW_ORG Part UPDATE 2011-02
// 0 !LICENSE Licensed under CC BY 2.0 and CC BY 4.0 : see CAreadme.txt
// 
// 0 BFC CERTIFY CCW
  [0,"BFC","CERTIFY"],
  [0,"BFC","CCW"],
// 
// 0 !HISTORY 2011-12-21 [cwdee] Reworked subparting technique
// 0 !HISTORY 2011-12-29 [PTadmin] Official Update 2011-02
// 
// 
// 1 16 0 0 0 4 0 0 0 1 0 0 0 4 4-4cyli.dat
  [1,16,0,0,0,4,0,0,0,1,0,0,0,4, ldraw_lib__4_4cyli(realsolid)],
// 0 BFC INVERTNEXT
  [0,"BFC","INVERTNEXT"],
// 1 16 0 0 0 2 0 0 0 1 0 0 0 2 4-4cyli.dat
  [1,16,0,0,0,2,0,0,0,1,0,0,0,2, ldraw_lib__4_4cyli(realsolid)],
// 0
];
module ldraw_lib__77(step=0, col=false, unit=2/5, alt=false, line=0.2, solid=!$preview)
    makepoly(ldraw_lib__77(solid), step=step, col=col, unit=unit, alt=alt, line=line, solid=solid);
ldraw_lib__77(line=0.2);
// file: 3004.scad
use <../lib.scad>
use <s/3004s01.scad>
$fa=1; $fs=0.2;
function ldraw_lib__3004(realsolid=false) = [
// 0 Brick  1 x  2
// 0 Name: 3004.dat
// 0 Author: James Jessiman
// 0 !LDRAW_ORG Part UPDATE 2022-05
// 0 !LICENSE Licensed under CC BY 2.0 and CC BY 4.0 : see CAreadme.txt
// 
// 0 BFC CERTIFY CCW
  [0,"BFC","CERTIFY"],
  [0,"BFC","CCW"],
// 
// 0 !HISTORY 2001-10-26 [PTadmin] Official Update 2001-01
// 0 !HISTORY 2002-05-07 {unknown} BFC Certification
// 0 !HISTORY 2002-06-11 [PTadmin] Official Update 2002-03
// 0 !HISTORY 2007-05-07 [PTadmin] Header formatted for Contributor Agreement
// 0 !HISTORY 2008-07-01 [PTadmin] Official Update 2008-01
// 0 !HISTORY 2022-08-04 [MagFors] Using subfile
// 0 !HISTORY 2022-09-15 [PTadmin] Official Update 2022-05
// 
// 
// 1 16 0 0 0 1 0 0 0 1 0 0 0 1 s\3004s01.dat
  [1,16,0,0,0,1,0,0,0,1,0,0,0,1, ldraw_lib__s__3004s01(realsolid)],
// 4 16 -20 24 -10 20 24 -10 20 0 -10 -20 0 -10
  [4,16,-20,24,-10,20,24,-10,20,0,-10,-20,0,-10],
];
module ldraw_lib__3004(step=0, col=false, unit=2/5, alt=false, line=0.2, solid=!$preview)
    makepoly(ldraw_lib__3004(solid), step=step, col=col, unit=unit, alt=alt, line=line, solid=solid);
ldraw_lib__3004(line=0.2);
// file: 76279.scad
use <../lib.scad>
use <77.scad>
use <u9053.scad>
$fa=1; $fs=0.2;
function ldraw_lib__76279(realsolid=false) = [
// 0 Technic Flex-System Hose  6L (120LDU)
// 0 Name: 76279.dat
// 0 Author: William Howard [WilliamH]
// 0 !LDRAW_ORG Part UPDATE 2011-02
// 0 !LICENSE Licensed under CC BY 2.0 and CC BY 4.0 : see CAreadme.txt
// 
// 0 BFC CERTIFY CCW
  [0,"BFC","CERTIFY"],
  [0,"BFC","CCW"],
// 
// 0 !KEYWORDS bar, tube
// 
// 0 !HISTORY 2011-12-21 [cwdee] Reworked subparting technique
// 0 !HISTORY 2011-12-29 [PTadmin] Official Update 2011-02
// 
// 
// 1 16 0 0 0 1 0 0 0 1 0 0 0 1 u9053.dat
  [1,16,0,0,0,1,0,0,0,1,0,0,0,1, ldraw_lib__u9053(realsolid)],
// 1 16 0 1 0 1 0 0 0 118 0 0 0 1 77.dat
  [1,16,0,1,0,1,0,0,0,118,0,0,0,1, ldraw_lib__77(realsolid)],
// 1 16 0 120 0 1 0 0 0 -1 0 0 0 1 u9053.dat
  [1,16,0,120,0,1,0,0,0,-1,0,0,0,1, ldraw_lib__u9053(realsolid)],
];
module ldraw_lib__76279(step=0, col=false, unit=2/5, alt=false, line=0.2, solid=!$preview)
    makepoly(ldraw_lib__76279(solid), step=step, col=col, unit=unit, alt=alt, line=line, solid=solid);
ldraw_lib__76279(line=0.2);
// main file
use <../lib.scad>
use <76279.scad>
$fa=1; $fs=0.2;
function ldraw_lib__75(realsolid=false) = [
// 0 ~Moved to 76279
// 0 Name: 75.dat
// 0 Author: [PTadmin]
// 0 !LDRAW_ORG Part UPDATE 2011-02
// 0 !LICENSE Licensed under CC BY 4.0 : see CAreadme.txt
// 
// 0 BFC CERTIFY CCW
  [0,"BFC","CERTIFY"],
  [0,"BFC","CCW"],
// 
// 0 !HISTORY 2011-12-29 [PTadmin] Official Update 2011-02
// 
// 
// 0 // Technic Flex-System Hose 6L (120LDU)
// 
// 1 16 60 1 0 0 -1 0 1 0 0 0 0 1 76279.dat
  [1,16,60,1,0,0,-1,0,1,0,0,0,0,1, ldraw_lib__76279(realsolid)],
];
module ldraw_lib__75(step=0, col=false, unit=2/5, alt=false, line=0.2, solid=!$preview)
    makepoly(ldraw_lib__75(solid), step=step, col=col, unit=unit, alt=alt, line=line, solid=solid);
ldraw_lib__75(line=0.2);
